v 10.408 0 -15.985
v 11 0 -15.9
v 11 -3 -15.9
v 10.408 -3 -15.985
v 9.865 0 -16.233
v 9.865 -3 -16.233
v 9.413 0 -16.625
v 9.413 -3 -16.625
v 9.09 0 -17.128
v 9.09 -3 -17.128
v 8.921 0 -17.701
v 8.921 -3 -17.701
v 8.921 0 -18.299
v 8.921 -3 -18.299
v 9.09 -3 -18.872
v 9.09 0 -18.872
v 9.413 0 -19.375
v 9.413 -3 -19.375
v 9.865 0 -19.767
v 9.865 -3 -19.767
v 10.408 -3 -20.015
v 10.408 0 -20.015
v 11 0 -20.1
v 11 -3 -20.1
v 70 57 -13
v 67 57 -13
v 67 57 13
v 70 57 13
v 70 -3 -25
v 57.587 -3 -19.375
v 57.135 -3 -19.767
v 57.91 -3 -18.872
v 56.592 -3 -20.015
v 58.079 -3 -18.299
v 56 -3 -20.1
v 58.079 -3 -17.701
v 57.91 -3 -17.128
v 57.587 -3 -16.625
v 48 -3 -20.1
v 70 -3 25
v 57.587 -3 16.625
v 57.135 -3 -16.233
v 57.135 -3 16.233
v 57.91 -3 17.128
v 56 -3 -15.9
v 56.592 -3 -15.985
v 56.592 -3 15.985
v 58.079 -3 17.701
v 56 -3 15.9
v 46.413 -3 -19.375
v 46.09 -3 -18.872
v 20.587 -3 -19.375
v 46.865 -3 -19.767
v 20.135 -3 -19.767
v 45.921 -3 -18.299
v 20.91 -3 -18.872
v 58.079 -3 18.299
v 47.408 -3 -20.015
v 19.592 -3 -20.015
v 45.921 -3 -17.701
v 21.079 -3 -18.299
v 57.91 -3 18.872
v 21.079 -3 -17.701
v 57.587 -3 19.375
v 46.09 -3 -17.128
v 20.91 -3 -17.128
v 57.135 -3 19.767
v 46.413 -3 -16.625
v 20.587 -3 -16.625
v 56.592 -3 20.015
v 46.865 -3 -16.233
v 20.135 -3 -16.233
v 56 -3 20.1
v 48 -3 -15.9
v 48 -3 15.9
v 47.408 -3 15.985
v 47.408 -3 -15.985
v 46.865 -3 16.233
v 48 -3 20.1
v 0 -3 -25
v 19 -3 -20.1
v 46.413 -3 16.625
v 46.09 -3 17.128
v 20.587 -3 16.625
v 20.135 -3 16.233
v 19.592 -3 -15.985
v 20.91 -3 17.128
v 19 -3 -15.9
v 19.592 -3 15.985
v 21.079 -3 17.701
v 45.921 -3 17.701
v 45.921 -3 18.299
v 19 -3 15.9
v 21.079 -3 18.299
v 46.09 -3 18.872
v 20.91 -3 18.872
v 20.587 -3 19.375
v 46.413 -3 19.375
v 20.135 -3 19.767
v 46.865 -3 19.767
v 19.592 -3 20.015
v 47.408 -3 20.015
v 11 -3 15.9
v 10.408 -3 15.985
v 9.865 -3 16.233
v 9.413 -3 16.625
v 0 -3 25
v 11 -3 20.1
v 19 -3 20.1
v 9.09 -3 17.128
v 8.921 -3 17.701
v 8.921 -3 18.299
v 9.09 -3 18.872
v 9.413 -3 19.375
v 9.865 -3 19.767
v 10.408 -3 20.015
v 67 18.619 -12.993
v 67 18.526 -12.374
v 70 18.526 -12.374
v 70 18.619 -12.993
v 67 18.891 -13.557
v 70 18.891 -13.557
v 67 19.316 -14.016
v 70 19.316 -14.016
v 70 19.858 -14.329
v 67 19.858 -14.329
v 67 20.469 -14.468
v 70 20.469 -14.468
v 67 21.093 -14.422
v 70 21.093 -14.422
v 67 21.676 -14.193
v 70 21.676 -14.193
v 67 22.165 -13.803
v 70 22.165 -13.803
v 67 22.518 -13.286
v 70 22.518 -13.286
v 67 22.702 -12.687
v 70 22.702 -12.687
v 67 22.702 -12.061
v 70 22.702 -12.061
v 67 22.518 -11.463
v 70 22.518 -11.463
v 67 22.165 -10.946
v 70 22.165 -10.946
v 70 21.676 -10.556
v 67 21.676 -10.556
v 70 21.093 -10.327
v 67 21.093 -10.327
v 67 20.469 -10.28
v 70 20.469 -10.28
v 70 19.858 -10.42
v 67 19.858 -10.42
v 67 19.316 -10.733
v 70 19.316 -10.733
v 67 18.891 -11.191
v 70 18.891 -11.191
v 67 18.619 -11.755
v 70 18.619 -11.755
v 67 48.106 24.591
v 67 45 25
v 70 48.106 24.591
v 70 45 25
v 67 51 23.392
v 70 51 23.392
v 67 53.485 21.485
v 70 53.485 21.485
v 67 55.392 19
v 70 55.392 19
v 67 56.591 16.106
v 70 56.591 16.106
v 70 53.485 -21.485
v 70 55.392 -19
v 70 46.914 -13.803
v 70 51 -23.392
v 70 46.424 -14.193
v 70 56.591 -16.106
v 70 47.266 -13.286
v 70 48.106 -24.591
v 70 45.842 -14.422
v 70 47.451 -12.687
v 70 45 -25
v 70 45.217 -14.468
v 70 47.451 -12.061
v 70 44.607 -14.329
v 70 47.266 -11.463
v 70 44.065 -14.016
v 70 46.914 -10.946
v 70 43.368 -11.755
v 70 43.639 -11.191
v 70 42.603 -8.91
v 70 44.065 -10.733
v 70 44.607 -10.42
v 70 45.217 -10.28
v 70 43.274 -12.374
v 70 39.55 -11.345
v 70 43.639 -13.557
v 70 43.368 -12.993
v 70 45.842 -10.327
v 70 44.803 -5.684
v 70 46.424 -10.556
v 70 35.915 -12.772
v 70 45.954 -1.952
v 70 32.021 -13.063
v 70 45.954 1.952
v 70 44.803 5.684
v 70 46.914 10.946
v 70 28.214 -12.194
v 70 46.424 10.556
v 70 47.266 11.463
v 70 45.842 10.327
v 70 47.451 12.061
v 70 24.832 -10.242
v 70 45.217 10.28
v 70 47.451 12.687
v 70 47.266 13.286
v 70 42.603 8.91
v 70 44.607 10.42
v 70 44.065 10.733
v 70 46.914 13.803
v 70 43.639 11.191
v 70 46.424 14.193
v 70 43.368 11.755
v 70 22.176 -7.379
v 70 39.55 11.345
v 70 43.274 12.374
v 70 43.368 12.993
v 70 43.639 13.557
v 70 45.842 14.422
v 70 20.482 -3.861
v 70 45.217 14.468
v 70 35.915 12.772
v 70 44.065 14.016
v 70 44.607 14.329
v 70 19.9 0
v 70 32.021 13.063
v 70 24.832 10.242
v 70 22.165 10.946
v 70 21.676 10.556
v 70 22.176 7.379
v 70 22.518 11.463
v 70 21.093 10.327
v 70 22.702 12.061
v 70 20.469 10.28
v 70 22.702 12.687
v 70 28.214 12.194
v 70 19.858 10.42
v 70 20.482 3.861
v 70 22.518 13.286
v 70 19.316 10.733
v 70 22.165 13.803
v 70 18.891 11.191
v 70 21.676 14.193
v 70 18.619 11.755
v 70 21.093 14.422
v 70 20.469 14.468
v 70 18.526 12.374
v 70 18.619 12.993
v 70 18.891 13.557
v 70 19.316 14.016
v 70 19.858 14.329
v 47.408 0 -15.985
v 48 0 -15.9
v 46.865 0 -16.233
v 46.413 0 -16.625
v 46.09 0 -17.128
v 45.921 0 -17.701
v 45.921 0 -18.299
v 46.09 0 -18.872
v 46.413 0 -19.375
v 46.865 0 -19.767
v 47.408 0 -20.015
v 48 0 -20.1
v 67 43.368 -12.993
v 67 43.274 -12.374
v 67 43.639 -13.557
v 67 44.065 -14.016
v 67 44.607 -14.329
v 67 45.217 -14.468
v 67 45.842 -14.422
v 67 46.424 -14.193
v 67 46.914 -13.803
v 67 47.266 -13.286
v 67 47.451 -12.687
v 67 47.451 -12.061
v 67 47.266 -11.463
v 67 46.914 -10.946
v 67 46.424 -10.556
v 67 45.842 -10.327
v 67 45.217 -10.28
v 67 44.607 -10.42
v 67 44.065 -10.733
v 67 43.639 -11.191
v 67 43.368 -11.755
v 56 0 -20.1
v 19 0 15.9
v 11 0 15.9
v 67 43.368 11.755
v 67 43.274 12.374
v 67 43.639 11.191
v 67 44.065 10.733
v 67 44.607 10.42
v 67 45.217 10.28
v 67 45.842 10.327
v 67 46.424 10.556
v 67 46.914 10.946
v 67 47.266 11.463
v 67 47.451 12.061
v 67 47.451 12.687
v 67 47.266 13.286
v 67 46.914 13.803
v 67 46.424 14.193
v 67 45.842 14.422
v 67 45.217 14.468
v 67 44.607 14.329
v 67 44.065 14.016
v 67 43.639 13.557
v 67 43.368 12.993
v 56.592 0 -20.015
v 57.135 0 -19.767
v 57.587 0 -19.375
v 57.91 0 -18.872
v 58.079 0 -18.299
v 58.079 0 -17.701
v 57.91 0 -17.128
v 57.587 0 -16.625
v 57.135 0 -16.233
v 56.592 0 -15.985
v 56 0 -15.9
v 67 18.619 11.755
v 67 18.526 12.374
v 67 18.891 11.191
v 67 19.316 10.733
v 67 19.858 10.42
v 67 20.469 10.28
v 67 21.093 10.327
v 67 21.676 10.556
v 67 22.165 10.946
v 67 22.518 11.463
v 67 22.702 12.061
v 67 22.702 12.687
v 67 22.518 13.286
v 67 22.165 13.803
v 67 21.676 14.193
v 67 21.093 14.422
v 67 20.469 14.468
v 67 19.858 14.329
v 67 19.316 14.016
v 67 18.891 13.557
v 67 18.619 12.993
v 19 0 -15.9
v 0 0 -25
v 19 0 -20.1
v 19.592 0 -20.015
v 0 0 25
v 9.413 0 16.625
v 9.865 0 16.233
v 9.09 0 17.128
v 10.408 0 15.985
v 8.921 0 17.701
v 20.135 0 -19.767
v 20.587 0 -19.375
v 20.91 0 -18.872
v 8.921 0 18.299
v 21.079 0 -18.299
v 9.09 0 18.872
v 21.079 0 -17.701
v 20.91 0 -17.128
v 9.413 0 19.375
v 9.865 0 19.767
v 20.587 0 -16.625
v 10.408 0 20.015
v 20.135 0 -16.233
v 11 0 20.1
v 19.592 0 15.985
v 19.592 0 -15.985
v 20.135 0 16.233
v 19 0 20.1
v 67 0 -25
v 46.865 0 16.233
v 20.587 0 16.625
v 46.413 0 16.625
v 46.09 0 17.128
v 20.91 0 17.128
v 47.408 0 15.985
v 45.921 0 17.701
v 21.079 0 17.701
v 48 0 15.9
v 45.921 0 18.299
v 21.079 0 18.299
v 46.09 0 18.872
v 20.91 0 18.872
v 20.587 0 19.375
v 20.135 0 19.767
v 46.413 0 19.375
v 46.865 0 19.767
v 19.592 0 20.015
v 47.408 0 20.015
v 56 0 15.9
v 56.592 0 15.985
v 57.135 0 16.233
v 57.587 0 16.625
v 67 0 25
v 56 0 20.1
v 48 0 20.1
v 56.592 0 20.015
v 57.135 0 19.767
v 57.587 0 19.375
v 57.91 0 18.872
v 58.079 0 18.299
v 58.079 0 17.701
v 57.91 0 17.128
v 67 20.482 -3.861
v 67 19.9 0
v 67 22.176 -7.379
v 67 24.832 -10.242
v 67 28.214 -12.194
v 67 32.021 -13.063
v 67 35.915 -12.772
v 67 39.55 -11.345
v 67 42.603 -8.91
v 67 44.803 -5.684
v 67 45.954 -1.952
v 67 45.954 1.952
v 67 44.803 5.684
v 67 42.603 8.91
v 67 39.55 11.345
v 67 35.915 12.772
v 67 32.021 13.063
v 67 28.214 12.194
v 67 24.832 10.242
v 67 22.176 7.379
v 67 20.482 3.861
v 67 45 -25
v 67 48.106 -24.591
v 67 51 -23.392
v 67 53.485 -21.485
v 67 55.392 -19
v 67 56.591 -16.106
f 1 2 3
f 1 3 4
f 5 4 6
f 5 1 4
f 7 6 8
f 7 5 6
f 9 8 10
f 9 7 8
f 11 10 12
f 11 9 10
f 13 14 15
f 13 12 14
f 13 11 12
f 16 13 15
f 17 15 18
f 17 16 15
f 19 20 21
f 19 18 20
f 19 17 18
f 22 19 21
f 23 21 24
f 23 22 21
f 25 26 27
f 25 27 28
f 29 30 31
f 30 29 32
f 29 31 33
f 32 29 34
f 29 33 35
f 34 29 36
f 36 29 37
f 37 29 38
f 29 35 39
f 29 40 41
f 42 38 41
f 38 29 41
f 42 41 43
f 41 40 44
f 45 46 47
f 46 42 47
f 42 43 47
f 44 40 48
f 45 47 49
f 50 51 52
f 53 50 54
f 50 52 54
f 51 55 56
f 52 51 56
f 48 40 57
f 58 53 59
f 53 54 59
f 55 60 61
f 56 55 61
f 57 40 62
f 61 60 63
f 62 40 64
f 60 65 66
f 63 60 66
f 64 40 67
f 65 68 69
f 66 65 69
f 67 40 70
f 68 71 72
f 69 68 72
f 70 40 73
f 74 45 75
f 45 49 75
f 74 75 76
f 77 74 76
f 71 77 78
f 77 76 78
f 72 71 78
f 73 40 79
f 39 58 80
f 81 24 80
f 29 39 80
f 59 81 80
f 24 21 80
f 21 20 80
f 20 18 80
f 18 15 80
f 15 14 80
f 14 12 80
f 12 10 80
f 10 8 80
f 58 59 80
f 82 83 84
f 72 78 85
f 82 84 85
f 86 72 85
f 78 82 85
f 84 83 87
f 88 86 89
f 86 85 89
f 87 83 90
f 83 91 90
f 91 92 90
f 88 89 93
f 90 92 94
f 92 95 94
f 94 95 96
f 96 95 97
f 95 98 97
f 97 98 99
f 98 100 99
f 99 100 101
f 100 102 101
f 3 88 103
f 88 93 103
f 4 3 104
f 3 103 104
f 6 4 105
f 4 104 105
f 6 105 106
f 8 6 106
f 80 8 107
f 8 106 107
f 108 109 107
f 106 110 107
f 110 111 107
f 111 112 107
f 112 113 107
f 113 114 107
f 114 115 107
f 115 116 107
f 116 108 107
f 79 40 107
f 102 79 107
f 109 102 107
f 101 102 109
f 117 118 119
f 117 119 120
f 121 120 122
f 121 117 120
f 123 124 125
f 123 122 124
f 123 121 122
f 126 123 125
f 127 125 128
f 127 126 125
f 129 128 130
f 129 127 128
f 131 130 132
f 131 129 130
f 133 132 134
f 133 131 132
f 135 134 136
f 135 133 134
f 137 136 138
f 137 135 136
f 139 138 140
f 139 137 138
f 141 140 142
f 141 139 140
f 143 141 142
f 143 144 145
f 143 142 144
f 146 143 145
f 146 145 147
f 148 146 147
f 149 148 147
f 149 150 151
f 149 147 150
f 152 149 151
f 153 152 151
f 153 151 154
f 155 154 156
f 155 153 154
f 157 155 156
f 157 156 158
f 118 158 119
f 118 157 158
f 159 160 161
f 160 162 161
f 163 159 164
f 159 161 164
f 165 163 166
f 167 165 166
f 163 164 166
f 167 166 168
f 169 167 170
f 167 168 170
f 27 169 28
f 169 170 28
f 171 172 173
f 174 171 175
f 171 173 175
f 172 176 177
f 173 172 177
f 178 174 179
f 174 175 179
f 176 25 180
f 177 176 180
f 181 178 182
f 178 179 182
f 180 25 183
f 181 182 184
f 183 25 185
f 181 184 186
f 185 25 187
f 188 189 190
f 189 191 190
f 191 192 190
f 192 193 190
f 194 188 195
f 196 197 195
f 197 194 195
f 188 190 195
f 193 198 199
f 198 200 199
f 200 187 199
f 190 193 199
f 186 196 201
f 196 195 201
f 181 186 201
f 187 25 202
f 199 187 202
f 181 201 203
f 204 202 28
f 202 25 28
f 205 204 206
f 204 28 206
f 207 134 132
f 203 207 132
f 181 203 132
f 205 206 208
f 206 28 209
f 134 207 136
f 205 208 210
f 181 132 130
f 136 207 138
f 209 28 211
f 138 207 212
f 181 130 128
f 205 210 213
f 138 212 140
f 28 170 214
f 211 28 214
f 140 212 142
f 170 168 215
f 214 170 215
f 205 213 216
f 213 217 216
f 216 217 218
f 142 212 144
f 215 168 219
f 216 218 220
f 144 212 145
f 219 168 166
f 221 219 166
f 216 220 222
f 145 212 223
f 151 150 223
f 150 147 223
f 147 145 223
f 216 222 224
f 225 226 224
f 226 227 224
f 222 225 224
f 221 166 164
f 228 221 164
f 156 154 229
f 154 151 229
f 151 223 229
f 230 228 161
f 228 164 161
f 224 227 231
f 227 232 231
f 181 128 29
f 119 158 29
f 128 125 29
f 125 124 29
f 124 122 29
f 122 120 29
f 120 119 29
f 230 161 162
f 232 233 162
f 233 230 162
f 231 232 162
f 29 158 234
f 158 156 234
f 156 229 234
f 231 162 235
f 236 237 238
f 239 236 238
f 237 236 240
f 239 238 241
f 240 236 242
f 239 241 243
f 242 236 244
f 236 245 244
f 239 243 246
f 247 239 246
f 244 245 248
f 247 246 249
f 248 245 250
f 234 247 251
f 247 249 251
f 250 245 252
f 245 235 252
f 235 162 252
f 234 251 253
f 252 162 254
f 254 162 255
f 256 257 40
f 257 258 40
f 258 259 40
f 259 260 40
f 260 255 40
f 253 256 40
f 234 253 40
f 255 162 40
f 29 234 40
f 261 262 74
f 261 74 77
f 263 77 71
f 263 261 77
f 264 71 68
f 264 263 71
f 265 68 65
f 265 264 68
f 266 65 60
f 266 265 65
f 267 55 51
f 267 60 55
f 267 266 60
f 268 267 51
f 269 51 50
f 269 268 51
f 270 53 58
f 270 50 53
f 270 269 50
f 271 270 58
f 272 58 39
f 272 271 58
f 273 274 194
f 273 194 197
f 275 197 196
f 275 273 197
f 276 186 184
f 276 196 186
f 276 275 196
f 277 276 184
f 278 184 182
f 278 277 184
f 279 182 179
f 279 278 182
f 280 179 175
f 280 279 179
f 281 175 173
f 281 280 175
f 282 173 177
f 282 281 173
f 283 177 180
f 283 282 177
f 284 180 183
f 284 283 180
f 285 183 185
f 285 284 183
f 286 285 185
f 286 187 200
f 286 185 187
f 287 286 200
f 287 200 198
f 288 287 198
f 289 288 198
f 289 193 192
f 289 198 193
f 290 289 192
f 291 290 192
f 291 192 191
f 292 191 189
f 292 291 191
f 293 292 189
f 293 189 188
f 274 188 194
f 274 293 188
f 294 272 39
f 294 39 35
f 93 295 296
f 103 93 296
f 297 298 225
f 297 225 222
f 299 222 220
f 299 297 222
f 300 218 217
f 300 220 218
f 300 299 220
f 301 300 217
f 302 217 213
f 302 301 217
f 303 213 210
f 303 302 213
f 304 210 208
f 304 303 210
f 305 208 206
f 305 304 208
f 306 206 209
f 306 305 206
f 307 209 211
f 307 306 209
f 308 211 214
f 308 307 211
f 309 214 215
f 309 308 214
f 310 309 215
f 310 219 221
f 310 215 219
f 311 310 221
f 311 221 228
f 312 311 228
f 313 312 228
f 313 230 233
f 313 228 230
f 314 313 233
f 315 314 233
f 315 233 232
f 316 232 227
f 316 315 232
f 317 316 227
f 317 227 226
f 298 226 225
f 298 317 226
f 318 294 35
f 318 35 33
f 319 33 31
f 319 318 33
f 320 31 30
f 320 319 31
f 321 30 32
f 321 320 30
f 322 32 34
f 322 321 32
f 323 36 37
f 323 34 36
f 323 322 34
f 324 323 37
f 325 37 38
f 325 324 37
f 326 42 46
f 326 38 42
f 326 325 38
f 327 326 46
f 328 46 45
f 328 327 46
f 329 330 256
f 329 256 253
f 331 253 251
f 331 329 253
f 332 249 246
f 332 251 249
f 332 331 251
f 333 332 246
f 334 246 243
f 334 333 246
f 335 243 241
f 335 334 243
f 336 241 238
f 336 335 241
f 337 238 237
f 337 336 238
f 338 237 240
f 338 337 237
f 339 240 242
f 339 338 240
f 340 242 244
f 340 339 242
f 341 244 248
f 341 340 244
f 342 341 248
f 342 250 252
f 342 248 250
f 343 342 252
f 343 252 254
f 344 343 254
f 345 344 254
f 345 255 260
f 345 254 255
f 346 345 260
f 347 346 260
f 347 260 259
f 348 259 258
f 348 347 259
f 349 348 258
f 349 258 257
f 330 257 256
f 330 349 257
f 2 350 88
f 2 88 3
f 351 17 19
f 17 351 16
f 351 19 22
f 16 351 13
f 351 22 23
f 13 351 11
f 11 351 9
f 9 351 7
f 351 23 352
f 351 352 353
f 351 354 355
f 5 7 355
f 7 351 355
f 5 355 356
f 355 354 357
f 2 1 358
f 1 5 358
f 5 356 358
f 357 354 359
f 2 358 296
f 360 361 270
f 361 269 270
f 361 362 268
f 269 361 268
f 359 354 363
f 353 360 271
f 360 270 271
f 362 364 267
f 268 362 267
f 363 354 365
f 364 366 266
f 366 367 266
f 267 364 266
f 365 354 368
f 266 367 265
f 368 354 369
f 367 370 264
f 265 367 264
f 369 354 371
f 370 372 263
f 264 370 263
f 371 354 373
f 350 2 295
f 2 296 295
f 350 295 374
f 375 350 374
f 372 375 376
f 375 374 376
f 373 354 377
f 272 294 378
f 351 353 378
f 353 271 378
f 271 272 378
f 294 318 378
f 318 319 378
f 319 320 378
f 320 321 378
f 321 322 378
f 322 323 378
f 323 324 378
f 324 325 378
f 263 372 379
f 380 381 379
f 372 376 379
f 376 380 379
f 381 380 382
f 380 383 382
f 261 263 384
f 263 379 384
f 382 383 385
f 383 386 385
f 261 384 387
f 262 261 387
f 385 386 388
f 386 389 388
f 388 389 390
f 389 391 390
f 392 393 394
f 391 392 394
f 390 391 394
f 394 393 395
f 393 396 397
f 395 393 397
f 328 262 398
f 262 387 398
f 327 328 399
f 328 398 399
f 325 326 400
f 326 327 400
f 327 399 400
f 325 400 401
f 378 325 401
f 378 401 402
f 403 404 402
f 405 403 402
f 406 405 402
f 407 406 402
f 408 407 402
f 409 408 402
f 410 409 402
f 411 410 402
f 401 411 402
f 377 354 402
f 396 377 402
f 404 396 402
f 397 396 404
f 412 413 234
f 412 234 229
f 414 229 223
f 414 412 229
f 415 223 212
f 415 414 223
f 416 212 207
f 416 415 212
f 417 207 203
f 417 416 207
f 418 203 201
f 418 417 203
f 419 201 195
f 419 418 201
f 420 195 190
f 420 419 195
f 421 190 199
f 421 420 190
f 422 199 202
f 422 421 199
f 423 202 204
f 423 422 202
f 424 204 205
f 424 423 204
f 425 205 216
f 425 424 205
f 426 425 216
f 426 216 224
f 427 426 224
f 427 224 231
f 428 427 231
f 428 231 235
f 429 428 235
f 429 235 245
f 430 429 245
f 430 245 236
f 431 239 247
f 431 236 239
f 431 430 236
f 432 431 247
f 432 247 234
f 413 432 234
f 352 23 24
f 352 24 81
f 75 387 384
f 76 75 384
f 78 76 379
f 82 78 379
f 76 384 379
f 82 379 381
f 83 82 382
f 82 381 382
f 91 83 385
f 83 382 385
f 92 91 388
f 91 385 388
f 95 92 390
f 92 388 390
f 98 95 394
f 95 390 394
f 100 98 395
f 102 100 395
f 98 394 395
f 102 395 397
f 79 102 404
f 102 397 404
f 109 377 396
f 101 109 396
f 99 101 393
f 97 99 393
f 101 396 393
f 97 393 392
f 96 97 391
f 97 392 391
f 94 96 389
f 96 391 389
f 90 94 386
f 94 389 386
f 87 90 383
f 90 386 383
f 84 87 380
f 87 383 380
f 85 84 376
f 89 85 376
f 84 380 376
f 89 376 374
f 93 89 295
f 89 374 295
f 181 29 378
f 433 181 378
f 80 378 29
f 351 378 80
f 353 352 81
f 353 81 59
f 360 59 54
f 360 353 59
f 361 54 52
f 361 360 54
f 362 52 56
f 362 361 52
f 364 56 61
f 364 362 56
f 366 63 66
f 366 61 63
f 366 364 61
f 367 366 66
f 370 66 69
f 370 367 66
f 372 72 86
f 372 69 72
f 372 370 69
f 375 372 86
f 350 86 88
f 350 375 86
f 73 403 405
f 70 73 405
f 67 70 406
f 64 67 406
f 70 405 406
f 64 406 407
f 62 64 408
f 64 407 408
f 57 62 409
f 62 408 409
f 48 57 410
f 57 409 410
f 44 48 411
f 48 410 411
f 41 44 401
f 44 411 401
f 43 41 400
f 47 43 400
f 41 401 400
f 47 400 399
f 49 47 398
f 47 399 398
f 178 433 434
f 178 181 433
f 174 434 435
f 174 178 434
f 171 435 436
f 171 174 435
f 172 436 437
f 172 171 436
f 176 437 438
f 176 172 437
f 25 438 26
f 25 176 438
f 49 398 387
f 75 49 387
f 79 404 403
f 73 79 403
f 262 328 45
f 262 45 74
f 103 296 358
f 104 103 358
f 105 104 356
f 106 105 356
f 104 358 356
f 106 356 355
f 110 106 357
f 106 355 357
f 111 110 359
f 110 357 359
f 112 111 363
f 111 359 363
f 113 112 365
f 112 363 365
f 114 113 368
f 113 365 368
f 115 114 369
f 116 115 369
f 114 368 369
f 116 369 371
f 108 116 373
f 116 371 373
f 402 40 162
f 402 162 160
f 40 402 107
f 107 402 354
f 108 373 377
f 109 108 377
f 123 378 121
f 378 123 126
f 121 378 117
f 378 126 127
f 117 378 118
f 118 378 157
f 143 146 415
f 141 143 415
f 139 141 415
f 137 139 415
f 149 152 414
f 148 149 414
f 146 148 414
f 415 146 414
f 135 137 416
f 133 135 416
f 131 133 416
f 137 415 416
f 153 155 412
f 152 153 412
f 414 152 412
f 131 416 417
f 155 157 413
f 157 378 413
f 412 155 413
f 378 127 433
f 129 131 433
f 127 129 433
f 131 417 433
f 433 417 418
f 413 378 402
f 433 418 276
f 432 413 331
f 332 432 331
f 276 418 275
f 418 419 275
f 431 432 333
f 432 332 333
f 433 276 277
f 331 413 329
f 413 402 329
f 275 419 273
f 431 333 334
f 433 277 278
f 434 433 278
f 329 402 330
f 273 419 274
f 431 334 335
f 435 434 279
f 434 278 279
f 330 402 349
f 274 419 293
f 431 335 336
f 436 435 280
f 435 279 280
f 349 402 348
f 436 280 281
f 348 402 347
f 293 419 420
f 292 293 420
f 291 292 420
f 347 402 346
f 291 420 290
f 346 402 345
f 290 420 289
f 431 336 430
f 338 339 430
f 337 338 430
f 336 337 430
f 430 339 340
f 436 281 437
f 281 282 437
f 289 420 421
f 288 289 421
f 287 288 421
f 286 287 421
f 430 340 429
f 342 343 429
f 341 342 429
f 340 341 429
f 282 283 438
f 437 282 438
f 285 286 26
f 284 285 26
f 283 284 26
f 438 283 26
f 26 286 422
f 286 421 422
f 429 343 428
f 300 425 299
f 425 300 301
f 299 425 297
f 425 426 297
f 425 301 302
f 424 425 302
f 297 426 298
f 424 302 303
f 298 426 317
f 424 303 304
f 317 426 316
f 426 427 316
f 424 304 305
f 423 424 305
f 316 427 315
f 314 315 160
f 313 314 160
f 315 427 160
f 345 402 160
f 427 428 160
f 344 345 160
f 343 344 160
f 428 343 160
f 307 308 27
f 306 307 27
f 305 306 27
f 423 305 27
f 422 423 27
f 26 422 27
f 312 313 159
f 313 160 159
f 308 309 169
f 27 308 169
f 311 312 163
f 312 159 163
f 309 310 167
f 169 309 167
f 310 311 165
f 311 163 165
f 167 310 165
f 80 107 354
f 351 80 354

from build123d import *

# Parameters (mm, degrees)
EXTRUDE_1_DEPTH     = 25
CUT_EXTRUDE_1_REACH = 95.67
CUT_EXTRUDE_2_REACH = 95.67
SKETCH_3_R          = 13.1
SKETCH_3_R_2        = 2.1
FILLET_1_R          = 12


with BuildPart() as part:
    # 草图1 → 凸台-拉伸1 (new, symmetric)
    with BuildSketch(Plane.XY):
        Polygon((0, 0), (67, 0), (67, 57), (70, 57), (70, -3), (0, -3), align=None)
    extrude(amount=EXTRUDE_1_DEPTH, both=True)

    # 草图2 → 切除-拉伸1 (cut, up to next)
    with BuildSketch(Plane(origin=(0, 0, 0), x_dir=(1, 0, 0), z_dir=(0, 1, 0)), mode=Mode.PRIVATE) as cut_extrude_1_sk1:
        with BuildLine():
            Line((11, 20.1), (19, 20.1))
            ThreePointArc((19, 20.1), (21.1, 18), (19, 15.9))
            Line((19, 15.9), (11, 15.9))
            ThreePointArc((11, 15.9), (8.9, 18), (11, 20.1))
        make_face()
    cut_extrude_1_tool1 = extrude(cut_extrude_1_sk1.sketch, amount=-CUT_EXTRUDE_1_REACH, mode=Mode.PRIVATE) & part.part
    # 草图2 → 切除-拉伸1 (cut, up to next)
    with BuildSketch(Plane(origin=(0, 0, 0), x_dir=(1, 0, 0), z_dir=(0, 1, 0)), mode=Mode.PRIVATE) as cut_extrude_1_sk2:
        with BuildLine():
            Line((48, 20.1), (56, 20.1))
            ThreePointArc((56, 20.1), (58.1, 18), (56, 15.9))
            Line((56, 15.9), (48, 15.9))
            ThreePointArc((48, 15.9), (45.9, 18), (48, 20.1))
        make_face()
    cut_extrude_1_tool2 = extrude(cut_extrude_1_sk2.sketch, amount=-CUT_EXTRUDE_1_REACH, mode=Mode.PRIVATE) & part.part
    # 草图2 → 切除-拉伸1 (cut, up to next)
    with BuildSketch(Plane(origin=(0, 0, 0), x_dir=(1, 0, 0), z_dir=(0, 1, 0)), mode=Mode.PRIVATE) as cut_extrude_1_sk3:
        with BuildLine():
            Line((11, -20.1), (19, -20.1))
            ThreePointArc((19, -20.1), (21.1, -18), (19, -15.9))
            Line((19, -15.9), (11, -15.9))
            ThreePointArc((11, -15.9), (8.9, -18), (11, -20.1))
        make_face()
    cut_extrude_1_tool3 = extrude(cut_extrude_1_sk3.sketch, amount=-CUT_EXTRUDE_1_REACH, mode=Mode.PRIVATE) & part.part
    # 草图2 → 切除-拉伸1 (cut, up to next)
    with BuildSketch(Plane(origin=(0, 0, 0), x_dir=(1, 0, 0), z_dir=(0, 1, 0)), mode=Mode.PRIVATE) as cut_extrude_1_sk4:
        with BuildLine():
            Line((48, -20.1), (56, -20.1))
            ThreePointArc((56, -20.1), (58.1, -18), (56, -15.9))
            Line((56, -15.9), (48, -15.9))
            ThreePointArc((48, -15.9), (45.9, -18), (48, -20.1))
        make_face()
    cut_extrude_1_tool4 = extrude(cut_extrude_1_sk4.sketch, amount=-CUT_EXTRUDE_1_REACH, mode=Mode.PRIVATE) & part.part
    add(cut_extrude_1_tool1.solids().sort_by_distance((15, 0, -18))[0], mode=Mode.SUBTRACT)
    add(cut_extrude_1_tool2.solids().sort_by_distance((52, 0, -18))[0], mode=Mode.SUBTRACT)
    add(cut_extrude_1_tool3.solids().sort_by_distance((15, 0, 18))[0], mode=Mode.SUBTRACT)
    add(cut_extrude_1_tool4.solids().sort_by_distance((52, 0, 18))[0], mode=Mode.SUBTRACT)

    # 草图3 → 切除-拉伸2 (cut, up to next)
    with BuildSketch(Plane(origin=(0, 0, 0), x_dir=(0, 0, -1), z_dir=(1, 0, 0)), mode=Mode.PRIVATE) as cut_extrude_2_sk1:
        with Locations(Location((0, 33, 0), (0, 0, 270))):
            Circle(SKETCH_3_R)
    cut_extrude_2_tool1 = extrude(cut_extrude_2_sk1.sketch, amount=CUT_EXTRUDE_2_REACH, mode=Mode.PRIVATE) & part.part
    # 草图3 → 切除-拉伸2 (cut, up to next)
    with BuildSketch(Plane(origin=(0, 0, 0), x_dir=(0, 0, -1), z_dir=(1, 0, 0)), mode=Mode.PRIVATE) as cut_extrude_2_sk2:
        with Locations(Location((12.374368671, 45.374368671, 0), (0, 0, 270))):
            Circle(SKETCH_3_R_2)
    cut_extrude_2_tool2 = extrude(cut_extrude_2_sk2.sketch, amount=CUT_EXTRUDE_2_REACH, mode=Mode.PRIVATE) & part.part
    # 草图3 → 切除-拉伸2 (cut, up to next)
    with BuildSketch(Plane(origin=(0, 0, 0), x_dir=(0, 0, -1), z_dir=(1, 0, 0)), mode=Mode.PRIVATE) as cut_extrude_2_sk3:
        with Locations(Location((12.374368671, 20.625631329, 0), (0, 0, 270))):
            Circle(SKETCH_3_R_2)
    cut_extrude_2_tool3 = extrude(cut_extrude_2_sk3.sketch, amount=CUT_EXTRUDE_2_REACH, mode=Mode.PRIVATE) & part.part
    # 草图3 → 切除-拉伸2 (cut, up to next)
    with BuildSketch(Plane(origin=(0, 0, 0), x_dir=(0, 0, -1), z_dir=(1, 0, 0)), mode=Mode.PRIVATE) as cut_extrude_2_sk4:
        with Locations(Location((-12.374368671, 20.625631329, 0), (0, 0, 270))):
            Circle(SKETCH_3_R_2)
    cut_extrude_2_tool4 = extrude(cut_extrude_2_sk4.sketch, amount=CUT_EXTRUDE_2_REACH, mode=Mode.PRIVATE) & part.part
    # 草图3 → 切除-拉伸2 (cut, up to next)
    with BuildSketch(Plane(origin=(0, 0, 0), x_dir=(0, 0, -1), z_dir=(1, 0, 0)), mode=Mode.PRIVATE) as cut_extrude_2_sk5:
        with Locations(Location((-12.374368671, 45.374368671, 0), (0, 0, 270))):
            Circle(SKETCH_3_R_2)
    cut_extrude_2_tool5 = extrude(cut_extrude_2_sk5.sketch, amount=CUT_EXTRUDE_2_REACH, mode=Mode.PRIVATE) & part.part
    add(cut_extrude_2_tool1.solids().sort_by_distance((0, 33, 0))[0], mode=Mode.SUBTRACT)
    add(cut_extrude_2_tool2.solids().sort_by_distance((0, 45.374369, -12.374369))[0], mode=Mode.SUBTRACT)
    add(cut_extrude_2_tool3.solids().sort_by_distance((0, 20.625631, -12.374369))[0], mode=Mode.SUBTRACT)
    add(cut_extrude_2_tool4.solids().sort_by_distance((0, 20.625631, 12.374369))[0], mode=Mode.SUBTRACT)
    add(cut_extrude_2_tool5.solids().sort_by_distance((0, 45.374369, 12.374369))[0], mode=Mode.SUBTRACT)

    # 圆角1
    fillet_1_edges = [part.edges().sort_by_distance(p)[0] for p in [
        (68.5, 57, 25),
        (68.5, 57, -25),
    ]]
    fillet(fillet_1_edges, radius=FILLET_1_R)


solid = part.part
